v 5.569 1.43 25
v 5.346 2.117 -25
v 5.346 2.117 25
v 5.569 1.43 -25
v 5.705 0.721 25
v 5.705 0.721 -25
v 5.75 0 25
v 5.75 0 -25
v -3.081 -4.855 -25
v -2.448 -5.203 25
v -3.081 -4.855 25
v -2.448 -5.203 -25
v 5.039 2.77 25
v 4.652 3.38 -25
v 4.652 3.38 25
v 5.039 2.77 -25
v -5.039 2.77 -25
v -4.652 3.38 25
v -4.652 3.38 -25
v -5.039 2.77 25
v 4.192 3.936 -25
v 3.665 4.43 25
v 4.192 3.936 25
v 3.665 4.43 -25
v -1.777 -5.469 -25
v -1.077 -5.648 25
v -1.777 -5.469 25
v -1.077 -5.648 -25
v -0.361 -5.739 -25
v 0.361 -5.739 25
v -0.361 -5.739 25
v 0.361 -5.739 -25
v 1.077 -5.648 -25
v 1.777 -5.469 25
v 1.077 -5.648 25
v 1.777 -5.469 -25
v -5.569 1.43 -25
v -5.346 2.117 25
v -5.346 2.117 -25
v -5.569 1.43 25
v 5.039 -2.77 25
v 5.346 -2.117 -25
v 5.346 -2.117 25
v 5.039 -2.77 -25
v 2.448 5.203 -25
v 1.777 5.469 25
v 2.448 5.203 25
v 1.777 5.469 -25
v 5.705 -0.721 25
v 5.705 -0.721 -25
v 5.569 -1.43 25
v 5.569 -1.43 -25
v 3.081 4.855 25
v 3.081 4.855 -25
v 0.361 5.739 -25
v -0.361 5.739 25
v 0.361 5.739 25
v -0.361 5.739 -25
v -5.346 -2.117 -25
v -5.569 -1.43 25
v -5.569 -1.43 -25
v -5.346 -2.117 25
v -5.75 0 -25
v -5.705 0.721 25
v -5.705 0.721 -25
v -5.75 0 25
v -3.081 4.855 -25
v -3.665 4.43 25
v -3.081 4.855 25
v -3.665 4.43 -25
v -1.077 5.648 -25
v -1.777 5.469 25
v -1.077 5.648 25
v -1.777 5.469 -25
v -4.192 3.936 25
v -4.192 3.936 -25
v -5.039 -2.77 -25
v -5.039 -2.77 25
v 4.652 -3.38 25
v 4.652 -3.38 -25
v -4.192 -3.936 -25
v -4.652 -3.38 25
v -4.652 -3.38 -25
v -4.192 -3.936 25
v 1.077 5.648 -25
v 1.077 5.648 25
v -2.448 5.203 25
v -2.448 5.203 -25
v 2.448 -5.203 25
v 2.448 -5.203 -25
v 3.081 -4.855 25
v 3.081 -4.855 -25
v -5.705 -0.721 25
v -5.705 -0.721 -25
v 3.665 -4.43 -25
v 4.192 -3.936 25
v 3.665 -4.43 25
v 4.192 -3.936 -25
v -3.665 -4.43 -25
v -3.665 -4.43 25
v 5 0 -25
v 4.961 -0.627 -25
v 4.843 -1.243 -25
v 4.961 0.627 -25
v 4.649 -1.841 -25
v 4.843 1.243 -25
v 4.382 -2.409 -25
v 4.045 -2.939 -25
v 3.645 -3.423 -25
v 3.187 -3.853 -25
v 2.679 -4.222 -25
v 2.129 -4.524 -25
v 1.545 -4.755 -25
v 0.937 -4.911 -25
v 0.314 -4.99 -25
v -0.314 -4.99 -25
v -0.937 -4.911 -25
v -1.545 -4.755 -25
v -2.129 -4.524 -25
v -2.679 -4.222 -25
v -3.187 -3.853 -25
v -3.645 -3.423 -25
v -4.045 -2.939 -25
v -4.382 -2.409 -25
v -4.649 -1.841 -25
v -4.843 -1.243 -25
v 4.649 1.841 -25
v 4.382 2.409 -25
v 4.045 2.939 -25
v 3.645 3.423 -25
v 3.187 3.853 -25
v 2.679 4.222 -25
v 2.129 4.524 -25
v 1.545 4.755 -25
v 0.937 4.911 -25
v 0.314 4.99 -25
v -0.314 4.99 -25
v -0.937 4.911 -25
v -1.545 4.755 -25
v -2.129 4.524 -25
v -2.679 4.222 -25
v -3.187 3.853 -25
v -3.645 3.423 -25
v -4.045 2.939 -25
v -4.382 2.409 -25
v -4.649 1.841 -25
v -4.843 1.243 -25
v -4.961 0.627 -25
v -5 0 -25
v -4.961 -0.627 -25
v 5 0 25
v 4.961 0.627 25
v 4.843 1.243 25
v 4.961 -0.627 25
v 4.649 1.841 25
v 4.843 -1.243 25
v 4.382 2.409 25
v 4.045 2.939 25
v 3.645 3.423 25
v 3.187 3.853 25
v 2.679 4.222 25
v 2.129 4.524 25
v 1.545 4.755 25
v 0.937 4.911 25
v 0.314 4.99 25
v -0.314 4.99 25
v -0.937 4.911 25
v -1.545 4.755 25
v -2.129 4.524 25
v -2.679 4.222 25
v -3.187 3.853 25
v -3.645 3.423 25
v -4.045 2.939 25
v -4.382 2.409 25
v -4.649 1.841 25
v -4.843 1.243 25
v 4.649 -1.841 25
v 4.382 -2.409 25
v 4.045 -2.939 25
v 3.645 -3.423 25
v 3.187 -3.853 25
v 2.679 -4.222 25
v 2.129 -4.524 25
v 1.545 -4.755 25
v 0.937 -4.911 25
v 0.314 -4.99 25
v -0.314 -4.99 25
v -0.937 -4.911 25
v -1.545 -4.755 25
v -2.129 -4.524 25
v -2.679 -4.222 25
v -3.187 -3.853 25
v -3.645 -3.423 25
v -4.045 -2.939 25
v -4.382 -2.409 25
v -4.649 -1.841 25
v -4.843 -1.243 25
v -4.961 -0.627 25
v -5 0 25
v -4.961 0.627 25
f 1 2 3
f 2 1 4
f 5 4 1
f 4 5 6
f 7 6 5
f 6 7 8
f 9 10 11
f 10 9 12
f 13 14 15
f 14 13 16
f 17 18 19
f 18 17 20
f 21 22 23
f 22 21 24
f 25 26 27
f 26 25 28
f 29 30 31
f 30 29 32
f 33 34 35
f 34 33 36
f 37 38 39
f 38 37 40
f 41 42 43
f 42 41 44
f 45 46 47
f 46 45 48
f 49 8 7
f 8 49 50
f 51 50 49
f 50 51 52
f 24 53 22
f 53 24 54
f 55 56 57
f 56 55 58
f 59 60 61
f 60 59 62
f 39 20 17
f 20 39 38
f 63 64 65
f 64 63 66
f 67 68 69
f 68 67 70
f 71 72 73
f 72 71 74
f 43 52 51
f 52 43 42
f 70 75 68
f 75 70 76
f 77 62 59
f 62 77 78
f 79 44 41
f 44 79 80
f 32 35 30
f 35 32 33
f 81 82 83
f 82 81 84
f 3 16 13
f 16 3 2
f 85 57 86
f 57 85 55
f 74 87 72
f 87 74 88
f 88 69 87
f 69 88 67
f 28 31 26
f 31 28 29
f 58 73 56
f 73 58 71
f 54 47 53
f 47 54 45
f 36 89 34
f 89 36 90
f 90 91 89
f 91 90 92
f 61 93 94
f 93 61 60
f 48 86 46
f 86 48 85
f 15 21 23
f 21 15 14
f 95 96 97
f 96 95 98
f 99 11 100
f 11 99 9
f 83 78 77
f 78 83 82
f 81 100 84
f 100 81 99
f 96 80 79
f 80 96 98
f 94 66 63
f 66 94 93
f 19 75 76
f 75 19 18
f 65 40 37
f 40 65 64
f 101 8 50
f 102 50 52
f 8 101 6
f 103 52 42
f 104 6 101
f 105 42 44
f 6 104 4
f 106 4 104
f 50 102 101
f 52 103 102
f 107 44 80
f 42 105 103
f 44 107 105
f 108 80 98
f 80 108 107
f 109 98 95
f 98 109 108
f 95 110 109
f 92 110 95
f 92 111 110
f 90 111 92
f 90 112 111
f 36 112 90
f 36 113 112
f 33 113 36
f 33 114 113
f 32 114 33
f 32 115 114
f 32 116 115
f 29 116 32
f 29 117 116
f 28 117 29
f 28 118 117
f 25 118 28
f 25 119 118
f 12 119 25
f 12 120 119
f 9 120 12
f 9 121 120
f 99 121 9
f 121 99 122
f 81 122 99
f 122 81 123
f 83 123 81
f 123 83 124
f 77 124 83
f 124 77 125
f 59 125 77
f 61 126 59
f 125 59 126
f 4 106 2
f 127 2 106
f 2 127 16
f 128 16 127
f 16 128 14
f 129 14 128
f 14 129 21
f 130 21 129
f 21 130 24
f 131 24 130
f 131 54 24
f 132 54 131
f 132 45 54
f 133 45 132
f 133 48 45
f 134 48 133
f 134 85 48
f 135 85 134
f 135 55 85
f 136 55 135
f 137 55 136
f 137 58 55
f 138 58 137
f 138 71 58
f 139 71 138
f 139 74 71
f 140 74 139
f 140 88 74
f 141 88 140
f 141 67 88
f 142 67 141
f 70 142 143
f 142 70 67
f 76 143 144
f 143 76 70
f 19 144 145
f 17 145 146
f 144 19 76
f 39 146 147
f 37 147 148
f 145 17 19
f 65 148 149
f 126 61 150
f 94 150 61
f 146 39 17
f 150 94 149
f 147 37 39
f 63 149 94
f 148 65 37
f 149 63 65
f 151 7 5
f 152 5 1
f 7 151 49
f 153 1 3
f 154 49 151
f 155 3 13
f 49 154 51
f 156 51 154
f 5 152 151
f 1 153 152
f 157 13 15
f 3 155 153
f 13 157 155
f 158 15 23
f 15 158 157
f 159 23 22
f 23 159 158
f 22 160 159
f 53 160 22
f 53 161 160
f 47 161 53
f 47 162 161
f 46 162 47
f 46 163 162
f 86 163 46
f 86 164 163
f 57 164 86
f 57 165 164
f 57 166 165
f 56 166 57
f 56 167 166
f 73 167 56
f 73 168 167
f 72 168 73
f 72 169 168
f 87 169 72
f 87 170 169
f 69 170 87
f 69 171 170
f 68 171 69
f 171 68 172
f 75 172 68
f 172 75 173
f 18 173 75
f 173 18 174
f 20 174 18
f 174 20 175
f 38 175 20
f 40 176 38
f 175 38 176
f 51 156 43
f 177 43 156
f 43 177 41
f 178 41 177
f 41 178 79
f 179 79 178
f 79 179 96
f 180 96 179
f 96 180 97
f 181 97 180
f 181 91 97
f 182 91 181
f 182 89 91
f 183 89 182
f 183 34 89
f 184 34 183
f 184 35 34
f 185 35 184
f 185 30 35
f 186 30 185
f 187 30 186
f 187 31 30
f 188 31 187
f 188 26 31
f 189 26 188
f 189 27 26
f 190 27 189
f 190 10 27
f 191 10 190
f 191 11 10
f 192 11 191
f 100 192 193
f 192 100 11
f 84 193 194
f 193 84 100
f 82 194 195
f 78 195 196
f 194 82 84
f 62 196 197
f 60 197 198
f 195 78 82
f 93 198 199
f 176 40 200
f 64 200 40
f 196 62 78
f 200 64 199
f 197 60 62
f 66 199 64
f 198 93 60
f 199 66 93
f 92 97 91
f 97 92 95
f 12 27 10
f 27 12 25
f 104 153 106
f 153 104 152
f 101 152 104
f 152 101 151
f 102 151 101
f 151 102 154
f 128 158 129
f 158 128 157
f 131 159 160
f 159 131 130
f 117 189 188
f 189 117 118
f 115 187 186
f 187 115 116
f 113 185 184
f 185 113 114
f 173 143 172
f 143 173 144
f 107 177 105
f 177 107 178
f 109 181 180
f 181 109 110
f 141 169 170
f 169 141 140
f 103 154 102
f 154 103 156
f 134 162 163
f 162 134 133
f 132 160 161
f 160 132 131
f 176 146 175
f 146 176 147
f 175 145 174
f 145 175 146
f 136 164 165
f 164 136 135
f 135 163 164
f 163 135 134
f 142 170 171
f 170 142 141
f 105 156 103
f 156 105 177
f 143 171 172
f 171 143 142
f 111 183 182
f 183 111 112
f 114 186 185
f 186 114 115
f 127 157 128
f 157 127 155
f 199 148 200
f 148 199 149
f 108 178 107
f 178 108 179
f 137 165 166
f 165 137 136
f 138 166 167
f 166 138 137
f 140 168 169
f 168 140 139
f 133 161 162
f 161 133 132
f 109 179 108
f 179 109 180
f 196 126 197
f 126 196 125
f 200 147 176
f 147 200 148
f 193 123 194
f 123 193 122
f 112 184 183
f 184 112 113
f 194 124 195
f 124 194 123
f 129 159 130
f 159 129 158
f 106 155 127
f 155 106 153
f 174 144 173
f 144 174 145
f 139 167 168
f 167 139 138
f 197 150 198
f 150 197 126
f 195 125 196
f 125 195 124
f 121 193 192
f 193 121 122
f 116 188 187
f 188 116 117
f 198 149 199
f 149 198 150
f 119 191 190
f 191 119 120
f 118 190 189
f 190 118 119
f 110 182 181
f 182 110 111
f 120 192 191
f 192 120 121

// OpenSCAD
$fn = 50;


difference() {
	union() {
		translate(v = [0, 0, -25.0000000000]) {
			cylinder(h = 50, r = 5.7500000000);
		}
	}
	union() {
		translate(v = [0, 0, -100.0000000000]) {
			cylinder(h = 200, r = 5.0000000000);
		}
	}
}
